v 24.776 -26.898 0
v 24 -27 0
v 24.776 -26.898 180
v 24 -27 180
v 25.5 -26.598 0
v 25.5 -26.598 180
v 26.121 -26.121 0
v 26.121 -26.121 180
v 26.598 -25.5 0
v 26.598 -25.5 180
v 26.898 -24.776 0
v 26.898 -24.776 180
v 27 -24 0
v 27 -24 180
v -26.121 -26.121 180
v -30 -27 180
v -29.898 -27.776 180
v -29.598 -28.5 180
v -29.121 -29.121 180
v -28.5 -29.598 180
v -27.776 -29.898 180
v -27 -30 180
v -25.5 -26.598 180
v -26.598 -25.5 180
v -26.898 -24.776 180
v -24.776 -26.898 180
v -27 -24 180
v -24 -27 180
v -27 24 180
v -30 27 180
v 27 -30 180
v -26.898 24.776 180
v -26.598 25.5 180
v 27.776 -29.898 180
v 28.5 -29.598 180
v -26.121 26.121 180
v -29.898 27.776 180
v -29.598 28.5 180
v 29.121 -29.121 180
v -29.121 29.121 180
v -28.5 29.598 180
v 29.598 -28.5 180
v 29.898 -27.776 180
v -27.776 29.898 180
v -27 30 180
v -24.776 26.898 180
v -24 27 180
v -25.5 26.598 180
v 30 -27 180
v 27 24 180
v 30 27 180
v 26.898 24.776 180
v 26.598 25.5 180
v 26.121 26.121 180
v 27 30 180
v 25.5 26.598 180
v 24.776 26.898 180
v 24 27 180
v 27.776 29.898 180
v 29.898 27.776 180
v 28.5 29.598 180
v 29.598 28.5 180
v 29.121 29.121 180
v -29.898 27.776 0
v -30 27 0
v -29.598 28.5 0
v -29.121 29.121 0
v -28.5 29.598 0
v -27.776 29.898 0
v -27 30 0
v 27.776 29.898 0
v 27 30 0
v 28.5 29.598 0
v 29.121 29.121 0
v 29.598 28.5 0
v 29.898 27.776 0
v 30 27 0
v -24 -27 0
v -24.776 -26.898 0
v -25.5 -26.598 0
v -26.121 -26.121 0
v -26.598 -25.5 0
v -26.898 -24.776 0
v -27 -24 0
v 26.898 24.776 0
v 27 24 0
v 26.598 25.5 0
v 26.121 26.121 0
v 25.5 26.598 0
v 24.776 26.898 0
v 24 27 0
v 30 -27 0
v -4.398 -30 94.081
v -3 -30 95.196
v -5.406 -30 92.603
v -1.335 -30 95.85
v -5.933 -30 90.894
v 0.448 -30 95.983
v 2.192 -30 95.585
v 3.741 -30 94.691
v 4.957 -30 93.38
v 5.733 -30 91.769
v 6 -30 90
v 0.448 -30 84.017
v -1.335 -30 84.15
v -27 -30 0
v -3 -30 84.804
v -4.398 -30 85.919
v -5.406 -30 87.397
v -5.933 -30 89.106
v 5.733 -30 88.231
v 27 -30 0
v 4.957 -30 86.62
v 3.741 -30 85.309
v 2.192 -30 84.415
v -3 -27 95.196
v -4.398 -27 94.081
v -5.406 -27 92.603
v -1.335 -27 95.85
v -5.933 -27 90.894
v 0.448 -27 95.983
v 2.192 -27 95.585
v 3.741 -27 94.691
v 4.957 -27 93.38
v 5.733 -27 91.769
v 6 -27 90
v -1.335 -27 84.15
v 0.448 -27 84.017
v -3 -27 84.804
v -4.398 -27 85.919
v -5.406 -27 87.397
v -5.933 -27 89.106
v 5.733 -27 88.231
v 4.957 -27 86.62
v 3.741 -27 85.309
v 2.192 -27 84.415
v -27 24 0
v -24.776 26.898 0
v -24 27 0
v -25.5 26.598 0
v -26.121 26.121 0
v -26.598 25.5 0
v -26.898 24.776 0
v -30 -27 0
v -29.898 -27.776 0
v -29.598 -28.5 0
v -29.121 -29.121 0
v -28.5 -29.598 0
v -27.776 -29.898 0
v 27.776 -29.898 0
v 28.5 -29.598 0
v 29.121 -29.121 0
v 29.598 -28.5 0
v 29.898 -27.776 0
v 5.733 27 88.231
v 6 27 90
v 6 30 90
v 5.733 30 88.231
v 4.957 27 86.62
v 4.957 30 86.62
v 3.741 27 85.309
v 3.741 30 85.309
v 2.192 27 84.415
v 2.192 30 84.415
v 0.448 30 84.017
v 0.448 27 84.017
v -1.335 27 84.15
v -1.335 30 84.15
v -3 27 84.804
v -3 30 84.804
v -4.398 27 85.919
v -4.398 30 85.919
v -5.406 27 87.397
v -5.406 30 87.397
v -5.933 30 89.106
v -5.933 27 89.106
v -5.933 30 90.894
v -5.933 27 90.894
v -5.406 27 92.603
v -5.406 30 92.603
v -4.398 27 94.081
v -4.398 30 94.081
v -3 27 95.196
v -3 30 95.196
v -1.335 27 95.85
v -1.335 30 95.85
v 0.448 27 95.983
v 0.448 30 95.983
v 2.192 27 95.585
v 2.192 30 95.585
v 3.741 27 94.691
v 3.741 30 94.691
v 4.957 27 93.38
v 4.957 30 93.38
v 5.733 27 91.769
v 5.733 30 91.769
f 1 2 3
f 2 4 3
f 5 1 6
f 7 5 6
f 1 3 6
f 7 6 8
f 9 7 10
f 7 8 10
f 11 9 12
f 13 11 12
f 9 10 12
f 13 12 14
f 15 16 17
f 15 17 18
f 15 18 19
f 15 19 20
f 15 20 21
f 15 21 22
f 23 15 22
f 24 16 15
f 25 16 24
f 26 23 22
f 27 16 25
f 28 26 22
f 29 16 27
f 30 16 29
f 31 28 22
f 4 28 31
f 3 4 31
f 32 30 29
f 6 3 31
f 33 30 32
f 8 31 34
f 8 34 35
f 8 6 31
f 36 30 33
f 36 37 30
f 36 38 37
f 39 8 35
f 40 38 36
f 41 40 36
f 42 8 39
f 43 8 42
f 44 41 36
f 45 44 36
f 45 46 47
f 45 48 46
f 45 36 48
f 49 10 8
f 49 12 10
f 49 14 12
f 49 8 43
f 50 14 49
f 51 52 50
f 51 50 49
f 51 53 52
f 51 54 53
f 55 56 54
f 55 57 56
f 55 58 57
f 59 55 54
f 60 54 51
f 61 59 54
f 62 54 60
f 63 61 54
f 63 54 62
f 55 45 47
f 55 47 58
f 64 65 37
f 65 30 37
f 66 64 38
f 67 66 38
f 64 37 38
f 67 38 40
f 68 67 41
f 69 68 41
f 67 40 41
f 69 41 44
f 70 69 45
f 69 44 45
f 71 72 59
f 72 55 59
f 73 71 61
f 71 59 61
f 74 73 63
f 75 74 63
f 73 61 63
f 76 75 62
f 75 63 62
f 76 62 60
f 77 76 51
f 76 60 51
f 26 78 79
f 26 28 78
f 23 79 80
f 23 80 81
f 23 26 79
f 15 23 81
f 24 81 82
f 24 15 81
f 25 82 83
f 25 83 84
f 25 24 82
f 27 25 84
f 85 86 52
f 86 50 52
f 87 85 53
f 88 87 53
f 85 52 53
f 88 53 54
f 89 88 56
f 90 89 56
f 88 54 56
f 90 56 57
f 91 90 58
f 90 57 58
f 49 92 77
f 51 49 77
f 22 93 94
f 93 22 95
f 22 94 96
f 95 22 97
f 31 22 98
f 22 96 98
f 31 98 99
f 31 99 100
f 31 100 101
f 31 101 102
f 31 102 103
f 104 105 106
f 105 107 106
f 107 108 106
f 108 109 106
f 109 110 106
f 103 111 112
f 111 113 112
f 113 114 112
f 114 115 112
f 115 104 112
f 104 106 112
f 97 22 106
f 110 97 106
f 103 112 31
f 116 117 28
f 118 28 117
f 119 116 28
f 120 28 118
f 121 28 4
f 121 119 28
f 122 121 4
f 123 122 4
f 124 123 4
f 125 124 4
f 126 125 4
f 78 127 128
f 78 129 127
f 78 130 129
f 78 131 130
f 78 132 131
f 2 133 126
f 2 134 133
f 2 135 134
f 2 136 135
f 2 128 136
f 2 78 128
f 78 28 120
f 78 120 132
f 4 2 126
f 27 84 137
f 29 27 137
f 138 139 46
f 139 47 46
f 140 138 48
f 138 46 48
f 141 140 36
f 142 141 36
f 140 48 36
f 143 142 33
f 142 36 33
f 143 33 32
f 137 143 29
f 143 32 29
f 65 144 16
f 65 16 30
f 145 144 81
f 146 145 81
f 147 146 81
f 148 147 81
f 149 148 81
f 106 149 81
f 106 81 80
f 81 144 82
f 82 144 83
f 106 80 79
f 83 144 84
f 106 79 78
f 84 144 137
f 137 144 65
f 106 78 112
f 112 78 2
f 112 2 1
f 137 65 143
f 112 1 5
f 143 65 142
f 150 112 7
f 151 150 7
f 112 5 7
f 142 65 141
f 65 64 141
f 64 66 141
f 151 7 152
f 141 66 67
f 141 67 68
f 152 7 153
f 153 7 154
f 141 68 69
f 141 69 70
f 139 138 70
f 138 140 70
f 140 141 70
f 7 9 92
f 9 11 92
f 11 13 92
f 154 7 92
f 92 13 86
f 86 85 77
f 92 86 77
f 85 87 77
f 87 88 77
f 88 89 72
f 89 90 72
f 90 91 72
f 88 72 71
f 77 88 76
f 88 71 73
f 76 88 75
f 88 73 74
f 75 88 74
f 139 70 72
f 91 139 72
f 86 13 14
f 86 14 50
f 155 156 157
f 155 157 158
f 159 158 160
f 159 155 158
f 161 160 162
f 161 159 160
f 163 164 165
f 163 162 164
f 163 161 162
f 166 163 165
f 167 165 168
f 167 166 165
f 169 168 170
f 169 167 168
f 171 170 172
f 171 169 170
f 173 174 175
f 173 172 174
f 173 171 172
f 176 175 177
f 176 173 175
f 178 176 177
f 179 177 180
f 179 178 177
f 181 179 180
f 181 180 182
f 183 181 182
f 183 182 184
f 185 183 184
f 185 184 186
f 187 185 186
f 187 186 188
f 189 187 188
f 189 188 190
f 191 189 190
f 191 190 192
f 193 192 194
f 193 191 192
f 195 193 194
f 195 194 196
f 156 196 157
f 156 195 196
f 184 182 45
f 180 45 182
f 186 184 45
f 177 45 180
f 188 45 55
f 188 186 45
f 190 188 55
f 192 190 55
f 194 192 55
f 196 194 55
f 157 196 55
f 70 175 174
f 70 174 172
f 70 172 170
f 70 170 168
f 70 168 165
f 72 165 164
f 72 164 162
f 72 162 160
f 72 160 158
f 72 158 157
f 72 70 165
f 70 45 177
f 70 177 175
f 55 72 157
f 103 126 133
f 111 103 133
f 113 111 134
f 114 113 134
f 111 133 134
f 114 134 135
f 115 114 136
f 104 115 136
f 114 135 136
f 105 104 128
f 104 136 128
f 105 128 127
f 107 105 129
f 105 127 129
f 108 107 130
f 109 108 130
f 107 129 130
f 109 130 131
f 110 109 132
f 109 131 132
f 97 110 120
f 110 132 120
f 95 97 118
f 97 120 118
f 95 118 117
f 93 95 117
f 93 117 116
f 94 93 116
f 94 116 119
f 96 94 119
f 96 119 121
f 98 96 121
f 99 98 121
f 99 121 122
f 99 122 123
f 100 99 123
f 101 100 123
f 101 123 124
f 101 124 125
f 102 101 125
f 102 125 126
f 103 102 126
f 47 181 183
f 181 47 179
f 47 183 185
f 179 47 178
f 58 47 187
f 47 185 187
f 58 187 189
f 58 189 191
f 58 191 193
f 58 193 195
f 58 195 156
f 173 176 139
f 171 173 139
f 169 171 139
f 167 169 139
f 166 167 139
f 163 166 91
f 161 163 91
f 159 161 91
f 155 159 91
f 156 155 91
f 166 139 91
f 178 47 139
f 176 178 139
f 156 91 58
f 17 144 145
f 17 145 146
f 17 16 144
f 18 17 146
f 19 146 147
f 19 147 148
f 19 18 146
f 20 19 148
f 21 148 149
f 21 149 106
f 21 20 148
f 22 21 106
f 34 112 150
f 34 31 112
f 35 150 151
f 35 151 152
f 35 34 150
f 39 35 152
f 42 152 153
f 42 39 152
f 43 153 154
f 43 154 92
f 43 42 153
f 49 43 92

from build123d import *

# Parameters (mm, degrees)
SKETCH1_W               = 60
SKETCH1_H               = 60
SKETCH1_W_2             = 54
SKETCH1_H_2             = 54
BOSS_EXTRUDE1_DEPTH     = 180
FILLET1_R               = 3
SKETCH2_R               = 6
CUT_EXTRUDE1_DEPTH      = 31
CUT_EXTRUDE1_DEPTH_BACK = 31


with BuildPart() as part:
    # Sketch1 → Boss-Extrude1 (new body)
    with BuildSketch(Plane.XY):
        Rectangle(SKETCH1_W, SKETCH1_H)
        Rectangle(SKETCH1_W_2, SKETCH1_H_2, mode=Mode.SUBTRACT)
    extrude(amount=BOSS_EXTRUDE1_DEPTH)

    # Fillet1
    fillet1_edges = [part.edges().sort_by_distance(p)[0] for p in [
        (27, -27, 90),
        (27, 27, 90),
        (-27, 27, 90),
        (-27, -27, 90),
        (30, -30, 90),
        (-30, -30, 90),
        (-30, 30, 90),
        (30, 30, 90),
    ]]
    fillet(fillet1_edges, radius=FILLET1_R)

    # Sketch2 → Cut-Extrude1 (cut, two sides)
    with BuildSketch(Plane(origin=(0, 0, 0), x_dir=(1, 0, 0), z_dir=(0, 1, 0))) as cut_extrude1_sk:
        with Locations((0, -90)):
            Circle(SKETCH2_R)
    extrude(amount=CUT_EXTRUDE1_DEPTH, mode=Mode.SUBTRACT)
    extrude(cut_extrude1_sk.sketch, amount=-CUT_EXTRUDE1_DEPTH_BACK, mode=Mode.SUBTRACT)


solid = part.part
